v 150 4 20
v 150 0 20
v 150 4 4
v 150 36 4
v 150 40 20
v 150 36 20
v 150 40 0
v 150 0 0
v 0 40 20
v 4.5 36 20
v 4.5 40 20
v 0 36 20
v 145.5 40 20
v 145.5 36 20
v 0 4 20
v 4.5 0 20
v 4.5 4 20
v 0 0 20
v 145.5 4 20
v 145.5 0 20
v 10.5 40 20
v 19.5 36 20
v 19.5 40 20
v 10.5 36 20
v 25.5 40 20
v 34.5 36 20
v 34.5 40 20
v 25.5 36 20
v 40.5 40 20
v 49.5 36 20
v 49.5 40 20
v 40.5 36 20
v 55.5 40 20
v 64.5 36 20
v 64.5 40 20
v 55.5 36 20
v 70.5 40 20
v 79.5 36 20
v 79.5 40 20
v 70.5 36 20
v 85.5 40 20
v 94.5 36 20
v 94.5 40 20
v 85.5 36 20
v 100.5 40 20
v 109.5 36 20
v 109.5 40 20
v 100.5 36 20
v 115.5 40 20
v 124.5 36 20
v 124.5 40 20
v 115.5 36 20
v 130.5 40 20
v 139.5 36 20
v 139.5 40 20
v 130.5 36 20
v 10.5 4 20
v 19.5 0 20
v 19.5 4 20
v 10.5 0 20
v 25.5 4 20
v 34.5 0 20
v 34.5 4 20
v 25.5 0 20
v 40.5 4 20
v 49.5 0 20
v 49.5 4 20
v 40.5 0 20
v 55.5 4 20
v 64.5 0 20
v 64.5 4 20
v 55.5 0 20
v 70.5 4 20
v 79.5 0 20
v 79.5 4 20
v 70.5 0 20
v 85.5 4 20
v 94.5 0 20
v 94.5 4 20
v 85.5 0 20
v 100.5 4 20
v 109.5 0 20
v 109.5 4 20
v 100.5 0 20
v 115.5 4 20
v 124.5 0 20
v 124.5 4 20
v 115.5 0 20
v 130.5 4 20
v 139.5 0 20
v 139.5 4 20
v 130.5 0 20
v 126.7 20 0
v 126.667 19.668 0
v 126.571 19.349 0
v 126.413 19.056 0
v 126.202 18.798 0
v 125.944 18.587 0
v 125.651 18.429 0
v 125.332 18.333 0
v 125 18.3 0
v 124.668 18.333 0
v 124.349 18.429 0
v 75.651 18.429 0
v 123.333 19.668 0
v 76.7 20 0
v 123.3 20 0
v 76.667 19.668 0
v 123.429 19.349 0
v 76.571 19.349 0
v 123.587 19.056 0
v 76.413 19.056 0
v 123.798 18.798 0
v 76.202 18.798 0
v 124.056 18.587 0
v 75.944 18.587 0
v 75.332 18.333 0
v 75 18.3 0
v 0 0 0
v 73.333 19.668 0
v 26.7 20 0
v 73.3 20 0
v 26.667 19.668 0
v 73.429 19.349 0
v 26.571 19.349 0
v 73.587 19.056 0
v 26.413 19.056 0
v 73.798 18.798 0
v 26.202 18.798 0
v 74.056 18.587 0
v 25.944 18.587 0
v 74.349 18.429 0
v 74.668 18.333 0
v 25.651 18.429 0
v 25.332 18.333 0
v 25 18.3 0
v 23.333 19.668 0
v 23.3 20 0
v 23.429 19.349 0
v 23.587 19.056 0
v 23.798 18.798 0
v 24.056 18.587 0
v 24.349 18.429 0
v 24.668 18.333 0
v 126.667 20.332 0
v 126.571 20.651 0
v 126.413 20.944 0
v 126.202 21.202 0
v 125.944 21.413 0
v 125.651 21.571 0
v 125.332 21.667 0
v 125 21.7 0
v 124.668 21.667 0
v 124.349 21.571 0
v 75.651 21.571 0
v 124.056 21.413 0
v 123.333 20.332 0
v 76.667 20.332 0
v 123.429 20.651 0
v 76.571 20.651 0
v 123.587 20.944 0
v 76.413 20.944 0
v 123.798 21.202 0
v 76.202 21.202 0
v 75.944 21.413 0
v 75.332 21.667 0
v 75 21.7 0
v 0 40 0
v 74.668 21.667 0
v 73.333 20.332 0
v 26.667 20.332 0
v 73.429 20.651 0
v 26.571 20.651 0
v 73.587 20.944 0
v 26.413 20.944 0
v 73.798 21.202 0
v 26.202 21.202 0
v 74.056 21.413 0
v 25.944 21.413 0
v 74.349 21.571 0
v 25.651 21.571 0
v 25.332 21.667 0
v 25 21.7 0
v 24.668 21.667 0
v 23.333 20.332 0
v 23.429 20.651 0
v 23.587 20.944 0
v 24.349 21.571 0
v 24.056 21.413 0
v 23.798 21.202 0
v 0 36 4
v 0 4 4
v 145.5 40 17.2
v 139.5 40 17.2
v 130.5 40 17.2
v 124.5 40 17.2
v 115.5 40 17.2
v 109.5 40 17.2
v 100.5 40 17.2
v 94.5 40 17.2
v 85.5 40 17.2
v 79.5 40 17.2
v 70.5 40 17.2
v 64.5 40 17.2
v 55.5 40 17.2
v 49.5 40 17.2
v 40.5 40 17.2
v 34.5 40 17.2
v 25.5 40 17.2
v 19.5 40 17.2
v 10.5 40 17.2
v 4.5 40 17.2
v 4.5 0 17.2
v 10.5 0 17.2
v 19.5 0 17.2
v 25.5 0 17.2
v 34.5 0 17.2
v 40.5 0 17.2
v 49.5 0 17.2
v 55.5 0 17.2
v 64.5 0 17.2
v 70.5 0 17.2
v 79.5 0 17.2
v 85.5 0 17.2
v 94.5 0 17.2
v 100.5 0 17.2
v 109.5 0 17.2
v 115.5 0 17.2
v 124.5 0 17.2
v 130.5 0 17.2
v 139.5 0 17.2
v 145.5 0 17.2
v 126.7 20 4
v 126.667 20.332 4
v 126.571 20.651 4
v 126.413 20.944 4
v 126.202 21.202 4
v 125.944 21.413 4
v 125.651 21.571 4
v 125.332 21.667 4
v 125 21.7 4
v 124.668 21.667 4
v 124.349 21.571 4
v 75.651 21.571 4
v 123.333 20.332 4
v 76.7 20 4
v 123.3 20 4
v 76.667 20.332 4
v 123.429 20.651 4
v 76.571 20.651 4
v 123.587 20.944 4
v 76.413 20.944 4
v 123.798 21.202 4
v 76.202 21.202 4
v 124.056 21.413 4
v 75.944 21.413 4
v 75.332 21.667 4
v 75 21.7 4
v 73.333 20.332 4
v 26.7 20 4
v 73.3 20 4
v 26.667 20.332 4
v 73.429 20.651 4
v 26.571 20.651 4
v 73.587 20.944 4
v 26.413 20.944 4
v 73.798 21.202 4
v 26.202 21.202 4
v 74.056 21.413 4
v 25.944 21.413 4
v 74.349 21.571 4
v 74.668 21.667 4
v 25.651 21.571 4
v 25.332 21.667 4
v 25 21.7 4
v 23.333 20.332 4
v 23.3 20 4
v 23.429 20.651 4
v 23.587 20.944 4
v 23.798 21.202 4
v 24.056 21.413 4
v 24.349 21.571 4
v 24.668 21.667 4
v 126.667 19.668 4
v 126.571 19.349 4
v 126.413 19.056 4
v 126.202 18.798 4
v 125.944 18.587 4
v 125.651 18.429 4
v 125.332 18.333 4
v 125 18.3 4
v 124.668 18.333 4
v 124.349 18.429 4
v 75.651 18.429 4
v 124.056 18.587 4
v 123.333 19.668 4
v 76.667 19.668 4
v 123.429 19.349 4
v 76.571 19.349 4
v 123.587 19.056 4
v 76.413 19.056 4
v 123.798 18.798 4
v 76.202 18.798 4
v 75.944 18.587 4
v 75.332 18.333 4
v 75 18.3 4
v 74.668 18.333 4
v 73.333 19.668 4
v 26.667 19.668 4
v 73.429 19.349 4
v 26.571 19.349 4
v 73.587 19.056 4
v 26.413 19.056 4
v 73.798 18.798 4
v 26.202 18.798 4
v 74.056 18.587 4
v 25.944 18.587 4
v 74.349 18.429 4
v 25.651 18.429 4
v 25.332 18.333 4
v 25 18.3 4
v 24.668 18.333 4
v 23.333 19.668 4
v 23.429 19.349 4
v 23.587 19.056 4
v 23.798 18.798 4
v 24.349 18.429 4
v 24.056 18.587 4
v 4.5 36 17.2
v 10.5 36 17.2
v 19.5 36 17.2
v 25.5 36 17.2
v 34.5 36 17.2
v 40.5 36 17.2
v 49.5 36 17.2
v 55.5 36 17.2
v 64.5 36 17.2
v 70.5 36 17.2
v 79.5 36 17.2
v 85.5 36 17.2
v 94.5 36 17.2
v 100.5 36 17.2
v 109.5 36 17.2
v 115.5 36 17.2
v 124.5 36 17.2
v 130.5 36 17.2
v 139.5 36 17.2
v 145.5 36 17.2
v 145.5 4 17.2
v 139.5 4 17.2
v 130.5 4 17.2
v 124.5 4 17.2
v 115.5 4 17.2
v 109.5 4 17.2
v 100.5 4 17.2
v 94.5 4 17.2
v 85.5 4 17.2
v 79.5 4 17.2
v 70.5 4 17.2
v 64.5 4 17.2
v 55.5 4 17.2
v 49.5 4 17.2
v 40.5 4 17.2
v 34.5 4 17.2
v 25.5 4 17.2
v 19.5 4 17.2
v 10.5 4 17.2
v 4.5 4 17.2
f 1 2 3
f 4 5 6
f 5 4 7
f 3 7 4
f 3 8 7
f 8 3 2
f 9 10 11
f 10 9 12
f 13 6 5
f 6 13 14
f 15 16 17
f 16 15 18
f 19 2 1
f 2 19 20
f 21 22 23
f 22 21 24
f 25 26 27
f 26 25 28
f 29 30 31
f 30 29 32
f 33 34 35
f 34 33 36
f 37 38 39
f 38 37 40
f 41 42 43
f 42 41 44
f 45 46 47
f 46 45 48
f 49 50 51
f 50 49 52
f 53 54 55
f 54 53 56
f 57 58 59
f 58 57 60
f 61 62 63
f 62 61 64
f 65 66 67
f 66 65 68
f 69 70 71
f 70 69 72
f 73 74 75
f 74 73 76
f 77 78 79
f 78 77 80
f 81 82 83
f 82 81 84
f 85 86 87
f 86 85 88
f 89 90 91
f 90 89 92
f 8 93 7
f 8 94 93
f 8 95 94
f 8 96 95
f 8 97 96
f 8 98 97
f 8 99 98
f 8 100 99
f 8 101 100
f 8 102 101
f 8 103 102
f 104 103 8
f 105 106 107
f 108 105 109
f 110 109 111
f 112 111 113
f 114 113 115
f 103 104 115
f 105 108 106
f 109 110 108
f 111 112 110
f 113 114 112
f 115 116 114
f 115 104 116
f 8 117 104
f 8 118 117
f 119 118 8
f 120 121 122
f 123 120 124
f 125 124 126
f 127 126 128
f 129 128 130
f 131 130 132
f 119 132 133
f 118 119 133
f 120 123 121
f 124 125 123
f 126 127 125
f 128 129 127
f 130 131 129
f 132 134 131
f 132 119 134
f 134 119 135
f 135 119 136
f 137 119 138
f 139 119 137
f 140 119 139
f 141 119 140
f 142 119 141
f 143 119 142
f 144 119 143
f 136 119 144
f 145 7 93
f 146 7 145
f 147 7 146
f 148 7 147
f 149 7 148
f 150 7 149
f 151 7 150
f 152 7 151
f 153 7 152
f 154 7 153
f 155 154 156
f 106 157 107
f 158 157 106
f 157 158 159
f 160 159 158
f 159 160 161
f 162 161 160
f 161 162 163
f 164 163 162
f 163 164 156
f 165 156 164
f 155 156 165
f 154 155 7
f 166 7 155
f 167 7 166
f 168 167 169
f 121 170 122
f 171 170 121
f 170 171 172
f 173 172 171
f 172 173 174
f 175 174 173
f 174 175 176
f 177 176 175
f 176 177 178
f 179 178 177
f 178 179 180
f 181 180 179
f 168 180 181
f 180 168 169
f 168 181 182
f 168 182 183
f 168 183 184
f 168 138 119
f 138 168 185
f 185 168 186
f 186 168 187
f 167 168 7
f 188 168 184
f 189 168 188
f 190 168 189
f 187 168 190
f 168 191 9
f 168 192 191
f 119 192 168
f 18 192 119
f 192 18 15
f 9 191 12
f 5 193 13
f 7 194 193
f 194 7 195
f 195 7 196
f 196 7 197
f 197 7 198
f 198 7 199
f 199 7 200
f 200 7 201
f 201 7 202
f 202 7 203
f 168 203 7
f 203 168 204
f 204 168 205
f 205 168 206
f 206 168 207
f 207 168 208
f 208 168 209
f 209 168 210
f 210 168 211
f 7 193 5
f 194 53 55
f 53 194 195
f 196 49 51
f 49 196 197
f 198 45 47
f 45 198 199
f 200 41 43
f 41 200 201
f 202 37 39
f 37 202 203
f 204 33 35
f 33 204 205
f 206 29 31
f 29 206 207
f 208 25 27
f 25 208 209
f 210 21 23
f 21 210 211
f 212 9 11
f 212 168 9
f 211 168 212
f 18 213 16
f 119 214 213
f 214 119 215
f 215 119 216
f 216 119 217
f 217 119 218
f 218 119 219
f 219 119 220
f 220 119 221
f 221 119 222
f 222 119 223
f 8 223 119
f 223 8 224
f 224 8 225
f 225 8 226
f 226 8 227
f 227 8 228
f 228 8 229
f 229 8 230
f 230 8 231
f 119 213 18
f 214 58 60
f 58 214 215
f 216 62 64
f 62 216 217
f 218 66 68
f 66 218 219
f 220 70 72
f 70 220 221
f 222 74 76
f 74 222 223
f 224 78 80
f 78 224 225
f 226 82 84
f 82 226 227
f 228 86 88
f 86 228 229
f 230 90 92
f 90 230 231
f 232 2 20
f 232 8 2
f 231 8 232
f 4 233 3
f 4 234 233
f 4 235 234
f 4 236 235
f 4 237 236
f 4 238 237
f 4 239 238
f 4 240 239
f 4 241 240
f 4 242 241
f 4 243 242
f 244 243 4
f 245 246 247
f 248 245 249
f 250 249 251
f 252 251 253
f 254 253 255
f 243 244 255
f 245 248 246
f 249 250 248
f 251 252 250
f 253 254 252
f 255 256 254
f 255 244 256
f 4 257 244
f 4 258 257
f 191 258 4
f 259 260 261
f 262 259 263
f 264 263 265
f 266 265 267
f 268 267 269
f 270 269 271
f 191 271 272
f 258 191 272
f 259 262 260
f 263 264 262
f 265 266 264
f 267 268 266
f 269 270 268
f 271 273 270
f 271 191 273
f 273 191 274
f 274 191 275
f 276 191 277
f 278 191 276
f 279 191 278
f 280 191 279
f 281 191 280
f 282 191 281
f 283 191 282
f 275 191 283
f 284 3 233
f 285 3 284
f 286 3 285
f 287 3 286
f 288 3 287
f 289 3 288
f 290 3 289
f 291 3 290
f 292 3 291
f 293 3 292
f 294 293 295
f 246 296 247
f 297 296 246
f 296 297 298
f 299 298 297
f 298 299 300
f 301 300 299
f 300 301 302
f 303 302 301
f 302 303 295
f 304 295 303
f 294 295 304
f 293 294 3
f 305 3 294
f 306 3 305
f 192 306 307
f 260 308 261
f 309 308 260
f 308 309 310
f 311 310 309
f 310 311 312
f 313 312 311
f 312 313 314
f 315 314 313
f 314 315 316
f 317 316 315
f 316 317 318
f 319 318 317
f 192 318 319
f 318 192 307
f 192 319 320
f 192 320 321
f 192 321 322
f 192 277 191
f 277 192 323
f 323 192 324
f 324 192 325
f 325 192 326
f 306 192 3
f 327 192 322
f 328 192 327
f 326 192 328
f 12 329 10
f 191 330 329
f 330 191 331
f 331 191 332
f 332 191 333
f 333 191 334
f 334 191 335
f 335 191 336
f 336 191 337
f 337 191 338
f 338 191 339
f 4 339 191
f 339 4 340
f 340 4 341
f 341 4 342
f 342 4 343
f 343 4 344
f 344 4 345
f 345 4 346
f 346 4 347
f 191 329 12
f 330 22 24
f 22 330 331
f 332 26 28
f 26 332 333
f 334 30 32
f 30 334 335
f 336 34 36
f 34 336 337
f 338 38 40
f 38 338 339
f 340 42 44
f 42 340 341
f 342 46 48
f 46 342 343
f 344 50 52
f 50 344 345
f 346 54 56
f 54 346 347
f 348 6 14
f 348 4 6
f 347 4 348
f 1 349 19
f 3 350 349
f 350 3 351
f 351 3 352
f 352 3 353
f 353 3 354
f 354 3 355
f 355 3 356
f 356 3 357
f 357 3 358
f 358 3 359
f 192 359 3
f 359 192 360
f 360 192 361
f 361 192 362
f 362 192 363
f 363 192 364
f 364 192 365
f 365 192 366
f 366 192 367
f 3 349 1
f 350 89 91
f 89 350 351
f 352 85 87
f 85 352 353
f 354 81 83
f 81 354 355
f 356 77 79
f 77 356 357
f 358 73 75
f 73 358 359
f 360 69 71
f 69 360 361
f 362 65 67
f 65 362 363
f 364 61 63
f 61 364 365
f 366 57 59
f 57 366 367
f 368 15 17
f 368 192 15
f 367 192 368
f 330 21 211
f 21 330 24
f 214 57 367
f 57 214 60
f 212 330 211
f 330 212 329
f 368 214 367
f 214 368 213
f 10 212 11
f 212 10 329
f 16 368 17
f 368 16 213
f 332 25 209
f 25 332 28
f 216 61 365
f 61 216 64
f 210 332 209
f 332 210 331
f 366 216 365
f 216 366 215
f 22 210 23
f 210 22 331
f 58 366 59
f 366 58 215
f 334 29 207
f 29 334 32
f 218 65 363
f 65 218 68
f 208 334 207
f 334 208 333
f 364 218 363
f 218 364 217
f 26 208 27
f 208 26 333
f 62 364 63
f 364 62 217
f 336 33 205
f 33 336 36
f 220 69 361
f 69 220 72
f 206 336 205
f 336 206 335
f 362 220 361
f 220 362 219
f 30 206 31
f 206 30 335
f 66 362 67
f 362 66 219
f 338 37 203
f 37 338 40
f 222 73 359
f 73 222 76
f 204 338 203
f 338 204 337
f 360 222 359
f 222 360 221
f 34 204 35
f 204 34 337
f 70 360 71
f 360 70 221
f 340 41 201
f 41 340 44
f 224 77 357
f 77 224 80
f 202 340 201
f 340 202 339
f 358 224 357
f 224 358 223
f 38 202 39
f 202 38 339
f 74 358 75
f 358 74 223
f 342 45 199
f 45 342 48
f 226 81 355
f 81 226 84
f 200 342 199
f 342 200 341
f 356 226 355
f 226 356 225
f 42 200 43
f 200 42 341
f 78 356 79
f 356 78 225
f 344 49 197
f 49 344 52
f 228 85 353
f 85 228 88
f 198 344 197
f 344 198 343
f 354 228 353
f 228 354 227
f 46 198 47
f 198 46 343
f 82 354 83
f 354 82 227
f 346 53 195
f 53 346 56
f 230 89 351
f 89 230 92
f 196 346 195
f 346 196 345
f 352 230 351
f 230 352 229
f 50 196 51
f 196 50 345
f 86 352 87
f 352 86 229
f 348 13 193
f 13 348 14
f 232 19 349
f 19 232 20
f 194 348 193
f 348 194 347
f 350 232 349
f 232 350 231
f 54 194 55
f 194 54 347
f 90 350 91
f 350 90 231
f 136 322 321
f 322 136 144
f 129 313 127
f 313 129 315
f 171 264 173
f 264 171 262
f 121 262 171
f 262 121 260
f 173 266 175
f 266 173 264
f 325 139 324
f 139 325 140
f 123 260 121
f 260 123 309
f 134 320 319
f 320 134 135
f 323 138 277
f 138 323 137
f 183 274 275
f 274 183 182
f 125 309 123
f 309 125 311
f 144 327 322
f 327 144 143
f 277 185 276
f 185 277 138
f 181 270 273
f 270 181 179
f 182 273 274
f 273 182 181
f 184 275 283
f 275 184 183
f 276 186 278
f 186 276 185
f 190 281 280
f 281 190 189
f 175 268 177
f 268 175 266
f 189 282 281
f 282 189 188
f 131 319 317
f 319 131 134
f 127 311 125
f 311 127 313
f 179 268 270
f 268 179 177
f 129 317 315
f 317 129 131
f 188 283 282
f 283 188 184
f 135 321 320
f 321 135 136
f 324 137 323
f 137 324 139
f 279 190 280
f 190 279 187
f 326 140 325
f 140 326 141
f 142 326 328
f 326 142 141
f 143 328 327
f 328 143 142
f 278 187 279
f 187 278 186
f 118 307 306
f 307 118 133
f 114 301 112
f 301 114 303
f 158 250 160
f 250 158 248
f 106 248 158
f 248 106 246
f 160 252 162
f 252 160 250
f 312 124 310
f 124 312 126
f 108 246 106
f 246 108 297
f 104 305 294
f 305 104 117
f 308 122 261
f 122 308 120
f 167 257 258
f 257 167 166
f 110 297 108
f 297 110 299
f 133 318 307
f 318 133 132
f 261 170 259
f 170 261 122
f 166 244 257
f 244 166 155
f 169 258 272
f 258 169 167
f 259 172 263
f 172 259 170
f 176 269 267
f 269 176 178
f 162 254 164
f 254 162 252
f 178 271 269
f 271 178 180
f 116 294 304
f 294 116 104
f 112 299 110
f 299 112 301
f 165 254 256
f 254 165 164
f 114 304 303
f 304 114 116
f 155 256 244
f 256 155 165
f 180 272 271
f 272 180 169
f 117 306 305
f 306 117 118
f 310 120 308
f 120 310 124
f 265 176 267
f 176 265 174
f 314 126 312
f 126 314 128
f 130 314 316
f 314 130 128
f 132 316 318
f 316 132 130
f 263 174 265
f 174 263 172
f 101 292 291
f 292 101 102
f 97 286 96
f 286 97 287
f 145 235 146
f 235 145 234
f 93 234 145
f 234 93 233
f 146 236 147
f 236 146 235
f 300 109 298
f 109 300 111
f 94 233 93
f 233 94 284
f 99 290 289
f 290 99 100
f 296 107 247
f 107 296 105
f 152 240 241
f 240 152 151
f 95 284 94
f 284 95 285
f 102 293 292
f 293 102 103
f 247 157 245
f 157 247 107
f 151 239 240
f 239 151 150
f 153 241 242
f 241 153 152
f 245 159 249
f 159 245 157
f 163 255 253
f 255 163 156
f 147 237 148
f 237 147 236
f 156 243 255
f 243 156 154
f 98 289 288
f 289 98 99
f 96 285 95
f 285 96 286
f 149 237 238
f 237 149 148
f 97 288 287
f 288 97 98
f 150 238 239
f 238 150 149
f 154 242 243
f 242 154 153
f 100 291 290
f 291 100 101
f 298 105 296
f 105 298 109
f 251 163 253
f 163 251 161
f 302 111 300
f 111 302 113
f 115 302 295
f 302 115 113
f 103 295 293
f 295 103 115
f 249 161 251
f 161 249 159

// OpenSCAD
$fn = 32;

// ----------------------------------------------------------------------
// Cable duct: 150 x 40 x 20 mm, 10 fingers
// ----------------------------------------------------------------------

// --- parameters (mm) ---
tray_len = 150;           // duct length, X
tray_w = 40;              // duct width, Y
tray_h = 20;              // duct height, Z
tray_t = 4;               // side wall thickness
floor_t = 4;              // floor thickness
slot_w = 6;               // finger slot width
slot_h = 13.2;            // finger slot height
fingers = 10;             // number of finger slots per side
pitch = 15;               // finger pitch
hole_d = 3.4;             // floor mounting hole
hole_n = 3;               // mounting holes in the floor

module shell() {
  difference() {
    cube([tray_len, tray_w, tray_h]);
    /* open top channel */
    translate([-tray_t - 1, tray_t, floor_t])
      cube([tray_len + 2 * tray_t + 2, tray_w - 2 * tray_t, tray_h + 1]);
  }
}

difference() {
  union() {
    shell();
  }
  /* finger slots cut through both side walls */
  for (i = [0 : fingers - 1]) translate([pitch / 2 + i * pitch - slot_w / 2, -1, floor_t + slot_h]) cube([slot_w, tray_w + 2, tray_h]);
  for (i = [0 : hole_n - 1]) translate([(tray_len / hole_n) * (i + 0.5), tray_w / 2, -1]) cylinder(h = floor_t + 2, d = hole_d);
}
